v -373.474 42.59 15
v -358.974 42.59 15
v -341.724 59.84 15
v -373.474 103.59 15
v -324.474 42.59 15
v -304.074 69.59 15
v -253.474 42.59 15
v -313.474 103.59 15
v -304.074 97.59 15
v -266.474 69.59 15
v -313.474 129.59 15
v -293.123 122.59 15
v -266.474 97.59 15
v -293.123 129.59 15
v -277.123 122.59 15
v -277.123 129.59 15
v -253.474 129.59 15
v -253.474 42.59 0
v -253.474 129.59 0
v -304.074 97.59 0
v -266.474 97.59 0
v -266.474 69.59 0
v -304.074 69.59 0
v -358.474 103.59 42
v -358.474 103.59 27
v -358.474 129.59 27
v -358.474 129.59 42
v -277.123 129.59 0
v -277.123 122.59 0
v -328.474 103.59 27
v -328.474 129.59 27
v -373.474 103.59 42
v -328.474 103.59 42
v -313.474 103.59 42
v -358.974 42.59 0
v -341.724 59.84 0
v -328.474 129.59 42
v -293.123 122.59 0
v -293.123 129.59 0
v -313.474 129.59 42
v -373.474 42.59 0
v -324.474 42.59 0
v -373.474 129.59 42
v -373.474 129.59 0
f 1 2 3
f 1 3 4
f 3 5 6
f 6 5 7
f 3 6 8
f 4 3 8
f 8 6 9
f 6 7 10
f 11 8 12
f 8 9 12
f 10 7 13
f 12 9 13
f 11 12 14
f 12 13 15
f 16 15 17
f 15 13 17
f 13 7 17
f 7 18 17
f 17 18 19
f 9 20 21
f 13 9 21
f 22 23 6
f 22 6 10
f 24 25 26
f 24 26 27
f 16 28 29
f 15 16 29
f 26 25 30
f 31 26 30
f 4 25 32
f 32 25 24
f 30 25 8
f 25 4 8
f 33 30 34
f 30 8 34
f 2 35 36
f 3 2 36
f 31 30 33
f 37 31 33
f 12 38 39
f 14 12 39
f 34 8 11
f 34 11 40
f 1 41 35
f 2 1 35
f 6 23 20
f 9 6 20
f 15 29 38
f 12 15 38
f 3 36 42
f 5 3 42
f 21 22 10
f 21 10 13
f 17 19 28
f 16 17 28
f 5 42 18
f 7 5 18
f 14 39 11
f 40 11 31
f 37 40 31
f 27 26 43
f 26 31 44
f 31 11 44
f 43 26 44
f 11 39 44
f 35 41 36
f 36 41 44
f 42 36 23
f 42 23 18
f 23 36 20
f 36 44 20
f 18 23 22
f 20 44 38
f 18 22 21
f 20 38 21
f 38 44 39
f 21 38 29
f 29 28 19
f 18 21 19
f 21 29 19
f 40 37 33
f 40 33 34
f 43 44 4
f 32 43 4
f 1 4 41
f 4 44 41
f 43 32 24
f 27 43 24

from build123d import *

# Parameters (mm, degrees)
F0_W     = 37.6
F0_H     = 28
F0_W_2   = 15
F0_H_2   = 26
F0_W_3   = 30
F1_DEPTH = 42
F2_W     = 30
F2_H     = 15
F2_W_2   = 60
F2_H_2   = 27
F3_DEPTH = 87.001
F4_W     = 61
F4_H     = 27
F5_DEPTH = 120.001


with BuildPart() as f1:
    # F0 (on Top) → F1 (new body)
    with BuildSketch(Plane.XY):
        Polygon((-373.474174, 103.589958), (-373.474174, 42.589958), (-358.974174, 42.589958), (-341.724174, 59.839958), (-324.474174, 42.589958), (-253.474174, 42.589958), (-253.474174, 129.589958), (-277.1233, 129.589958), (-277.1233, 122.589958), (-293.1233, 122.589958), (-293.1233, 129.589958), (-313.474174, 129.589958), (-313.474174, 103.589958), (-328.474174, 103.589958), (-358.474174, 103.589958), align=None)
        with Locations((-285.274174, 83.589958)):
            Rectangle(F0_W, F0_H, mode=Mode.SUBTRACT)
        with Locations((-365.974174, 116.589958)):
            Rectangle(F0_W_2, F0_H_2)
        with Locations((-343.474174, 116.589958)):
            Rectangle(F0_W_3, F0_H_2)
        with Locations((-320.974174, 116.589958)):
            Rectangle(F0_W_2, F0_H_2)
    extrude(amount=F1_DEPTH)

    # F2 (on face) → F3 (cut, through all)
    with BuildSketch(Plane.XZ.offset(-42.589958)):
        with Locations((-343.474174, 34.5)):
            Rectangle(F2_W, F2_H)
        with Locations((-283.474174, 28.5)):
            Rectangle(F2_W_2, F2_H_2)
    extrude(amount=-F3_DEPTH, mode=Mode.SUBTRACT)

    # F4 (on face) → F5 (cut, through all)
    with BuildSketch(Plane.YZ.offset(-253.474174)):
        with Locations((73.089958, 28.5)):
            Rectangle(F4_W, F4_H)
    extrude(amount=-F5_DEPTH, mode=Mode.SUBTRACT)


solid = f1.part
